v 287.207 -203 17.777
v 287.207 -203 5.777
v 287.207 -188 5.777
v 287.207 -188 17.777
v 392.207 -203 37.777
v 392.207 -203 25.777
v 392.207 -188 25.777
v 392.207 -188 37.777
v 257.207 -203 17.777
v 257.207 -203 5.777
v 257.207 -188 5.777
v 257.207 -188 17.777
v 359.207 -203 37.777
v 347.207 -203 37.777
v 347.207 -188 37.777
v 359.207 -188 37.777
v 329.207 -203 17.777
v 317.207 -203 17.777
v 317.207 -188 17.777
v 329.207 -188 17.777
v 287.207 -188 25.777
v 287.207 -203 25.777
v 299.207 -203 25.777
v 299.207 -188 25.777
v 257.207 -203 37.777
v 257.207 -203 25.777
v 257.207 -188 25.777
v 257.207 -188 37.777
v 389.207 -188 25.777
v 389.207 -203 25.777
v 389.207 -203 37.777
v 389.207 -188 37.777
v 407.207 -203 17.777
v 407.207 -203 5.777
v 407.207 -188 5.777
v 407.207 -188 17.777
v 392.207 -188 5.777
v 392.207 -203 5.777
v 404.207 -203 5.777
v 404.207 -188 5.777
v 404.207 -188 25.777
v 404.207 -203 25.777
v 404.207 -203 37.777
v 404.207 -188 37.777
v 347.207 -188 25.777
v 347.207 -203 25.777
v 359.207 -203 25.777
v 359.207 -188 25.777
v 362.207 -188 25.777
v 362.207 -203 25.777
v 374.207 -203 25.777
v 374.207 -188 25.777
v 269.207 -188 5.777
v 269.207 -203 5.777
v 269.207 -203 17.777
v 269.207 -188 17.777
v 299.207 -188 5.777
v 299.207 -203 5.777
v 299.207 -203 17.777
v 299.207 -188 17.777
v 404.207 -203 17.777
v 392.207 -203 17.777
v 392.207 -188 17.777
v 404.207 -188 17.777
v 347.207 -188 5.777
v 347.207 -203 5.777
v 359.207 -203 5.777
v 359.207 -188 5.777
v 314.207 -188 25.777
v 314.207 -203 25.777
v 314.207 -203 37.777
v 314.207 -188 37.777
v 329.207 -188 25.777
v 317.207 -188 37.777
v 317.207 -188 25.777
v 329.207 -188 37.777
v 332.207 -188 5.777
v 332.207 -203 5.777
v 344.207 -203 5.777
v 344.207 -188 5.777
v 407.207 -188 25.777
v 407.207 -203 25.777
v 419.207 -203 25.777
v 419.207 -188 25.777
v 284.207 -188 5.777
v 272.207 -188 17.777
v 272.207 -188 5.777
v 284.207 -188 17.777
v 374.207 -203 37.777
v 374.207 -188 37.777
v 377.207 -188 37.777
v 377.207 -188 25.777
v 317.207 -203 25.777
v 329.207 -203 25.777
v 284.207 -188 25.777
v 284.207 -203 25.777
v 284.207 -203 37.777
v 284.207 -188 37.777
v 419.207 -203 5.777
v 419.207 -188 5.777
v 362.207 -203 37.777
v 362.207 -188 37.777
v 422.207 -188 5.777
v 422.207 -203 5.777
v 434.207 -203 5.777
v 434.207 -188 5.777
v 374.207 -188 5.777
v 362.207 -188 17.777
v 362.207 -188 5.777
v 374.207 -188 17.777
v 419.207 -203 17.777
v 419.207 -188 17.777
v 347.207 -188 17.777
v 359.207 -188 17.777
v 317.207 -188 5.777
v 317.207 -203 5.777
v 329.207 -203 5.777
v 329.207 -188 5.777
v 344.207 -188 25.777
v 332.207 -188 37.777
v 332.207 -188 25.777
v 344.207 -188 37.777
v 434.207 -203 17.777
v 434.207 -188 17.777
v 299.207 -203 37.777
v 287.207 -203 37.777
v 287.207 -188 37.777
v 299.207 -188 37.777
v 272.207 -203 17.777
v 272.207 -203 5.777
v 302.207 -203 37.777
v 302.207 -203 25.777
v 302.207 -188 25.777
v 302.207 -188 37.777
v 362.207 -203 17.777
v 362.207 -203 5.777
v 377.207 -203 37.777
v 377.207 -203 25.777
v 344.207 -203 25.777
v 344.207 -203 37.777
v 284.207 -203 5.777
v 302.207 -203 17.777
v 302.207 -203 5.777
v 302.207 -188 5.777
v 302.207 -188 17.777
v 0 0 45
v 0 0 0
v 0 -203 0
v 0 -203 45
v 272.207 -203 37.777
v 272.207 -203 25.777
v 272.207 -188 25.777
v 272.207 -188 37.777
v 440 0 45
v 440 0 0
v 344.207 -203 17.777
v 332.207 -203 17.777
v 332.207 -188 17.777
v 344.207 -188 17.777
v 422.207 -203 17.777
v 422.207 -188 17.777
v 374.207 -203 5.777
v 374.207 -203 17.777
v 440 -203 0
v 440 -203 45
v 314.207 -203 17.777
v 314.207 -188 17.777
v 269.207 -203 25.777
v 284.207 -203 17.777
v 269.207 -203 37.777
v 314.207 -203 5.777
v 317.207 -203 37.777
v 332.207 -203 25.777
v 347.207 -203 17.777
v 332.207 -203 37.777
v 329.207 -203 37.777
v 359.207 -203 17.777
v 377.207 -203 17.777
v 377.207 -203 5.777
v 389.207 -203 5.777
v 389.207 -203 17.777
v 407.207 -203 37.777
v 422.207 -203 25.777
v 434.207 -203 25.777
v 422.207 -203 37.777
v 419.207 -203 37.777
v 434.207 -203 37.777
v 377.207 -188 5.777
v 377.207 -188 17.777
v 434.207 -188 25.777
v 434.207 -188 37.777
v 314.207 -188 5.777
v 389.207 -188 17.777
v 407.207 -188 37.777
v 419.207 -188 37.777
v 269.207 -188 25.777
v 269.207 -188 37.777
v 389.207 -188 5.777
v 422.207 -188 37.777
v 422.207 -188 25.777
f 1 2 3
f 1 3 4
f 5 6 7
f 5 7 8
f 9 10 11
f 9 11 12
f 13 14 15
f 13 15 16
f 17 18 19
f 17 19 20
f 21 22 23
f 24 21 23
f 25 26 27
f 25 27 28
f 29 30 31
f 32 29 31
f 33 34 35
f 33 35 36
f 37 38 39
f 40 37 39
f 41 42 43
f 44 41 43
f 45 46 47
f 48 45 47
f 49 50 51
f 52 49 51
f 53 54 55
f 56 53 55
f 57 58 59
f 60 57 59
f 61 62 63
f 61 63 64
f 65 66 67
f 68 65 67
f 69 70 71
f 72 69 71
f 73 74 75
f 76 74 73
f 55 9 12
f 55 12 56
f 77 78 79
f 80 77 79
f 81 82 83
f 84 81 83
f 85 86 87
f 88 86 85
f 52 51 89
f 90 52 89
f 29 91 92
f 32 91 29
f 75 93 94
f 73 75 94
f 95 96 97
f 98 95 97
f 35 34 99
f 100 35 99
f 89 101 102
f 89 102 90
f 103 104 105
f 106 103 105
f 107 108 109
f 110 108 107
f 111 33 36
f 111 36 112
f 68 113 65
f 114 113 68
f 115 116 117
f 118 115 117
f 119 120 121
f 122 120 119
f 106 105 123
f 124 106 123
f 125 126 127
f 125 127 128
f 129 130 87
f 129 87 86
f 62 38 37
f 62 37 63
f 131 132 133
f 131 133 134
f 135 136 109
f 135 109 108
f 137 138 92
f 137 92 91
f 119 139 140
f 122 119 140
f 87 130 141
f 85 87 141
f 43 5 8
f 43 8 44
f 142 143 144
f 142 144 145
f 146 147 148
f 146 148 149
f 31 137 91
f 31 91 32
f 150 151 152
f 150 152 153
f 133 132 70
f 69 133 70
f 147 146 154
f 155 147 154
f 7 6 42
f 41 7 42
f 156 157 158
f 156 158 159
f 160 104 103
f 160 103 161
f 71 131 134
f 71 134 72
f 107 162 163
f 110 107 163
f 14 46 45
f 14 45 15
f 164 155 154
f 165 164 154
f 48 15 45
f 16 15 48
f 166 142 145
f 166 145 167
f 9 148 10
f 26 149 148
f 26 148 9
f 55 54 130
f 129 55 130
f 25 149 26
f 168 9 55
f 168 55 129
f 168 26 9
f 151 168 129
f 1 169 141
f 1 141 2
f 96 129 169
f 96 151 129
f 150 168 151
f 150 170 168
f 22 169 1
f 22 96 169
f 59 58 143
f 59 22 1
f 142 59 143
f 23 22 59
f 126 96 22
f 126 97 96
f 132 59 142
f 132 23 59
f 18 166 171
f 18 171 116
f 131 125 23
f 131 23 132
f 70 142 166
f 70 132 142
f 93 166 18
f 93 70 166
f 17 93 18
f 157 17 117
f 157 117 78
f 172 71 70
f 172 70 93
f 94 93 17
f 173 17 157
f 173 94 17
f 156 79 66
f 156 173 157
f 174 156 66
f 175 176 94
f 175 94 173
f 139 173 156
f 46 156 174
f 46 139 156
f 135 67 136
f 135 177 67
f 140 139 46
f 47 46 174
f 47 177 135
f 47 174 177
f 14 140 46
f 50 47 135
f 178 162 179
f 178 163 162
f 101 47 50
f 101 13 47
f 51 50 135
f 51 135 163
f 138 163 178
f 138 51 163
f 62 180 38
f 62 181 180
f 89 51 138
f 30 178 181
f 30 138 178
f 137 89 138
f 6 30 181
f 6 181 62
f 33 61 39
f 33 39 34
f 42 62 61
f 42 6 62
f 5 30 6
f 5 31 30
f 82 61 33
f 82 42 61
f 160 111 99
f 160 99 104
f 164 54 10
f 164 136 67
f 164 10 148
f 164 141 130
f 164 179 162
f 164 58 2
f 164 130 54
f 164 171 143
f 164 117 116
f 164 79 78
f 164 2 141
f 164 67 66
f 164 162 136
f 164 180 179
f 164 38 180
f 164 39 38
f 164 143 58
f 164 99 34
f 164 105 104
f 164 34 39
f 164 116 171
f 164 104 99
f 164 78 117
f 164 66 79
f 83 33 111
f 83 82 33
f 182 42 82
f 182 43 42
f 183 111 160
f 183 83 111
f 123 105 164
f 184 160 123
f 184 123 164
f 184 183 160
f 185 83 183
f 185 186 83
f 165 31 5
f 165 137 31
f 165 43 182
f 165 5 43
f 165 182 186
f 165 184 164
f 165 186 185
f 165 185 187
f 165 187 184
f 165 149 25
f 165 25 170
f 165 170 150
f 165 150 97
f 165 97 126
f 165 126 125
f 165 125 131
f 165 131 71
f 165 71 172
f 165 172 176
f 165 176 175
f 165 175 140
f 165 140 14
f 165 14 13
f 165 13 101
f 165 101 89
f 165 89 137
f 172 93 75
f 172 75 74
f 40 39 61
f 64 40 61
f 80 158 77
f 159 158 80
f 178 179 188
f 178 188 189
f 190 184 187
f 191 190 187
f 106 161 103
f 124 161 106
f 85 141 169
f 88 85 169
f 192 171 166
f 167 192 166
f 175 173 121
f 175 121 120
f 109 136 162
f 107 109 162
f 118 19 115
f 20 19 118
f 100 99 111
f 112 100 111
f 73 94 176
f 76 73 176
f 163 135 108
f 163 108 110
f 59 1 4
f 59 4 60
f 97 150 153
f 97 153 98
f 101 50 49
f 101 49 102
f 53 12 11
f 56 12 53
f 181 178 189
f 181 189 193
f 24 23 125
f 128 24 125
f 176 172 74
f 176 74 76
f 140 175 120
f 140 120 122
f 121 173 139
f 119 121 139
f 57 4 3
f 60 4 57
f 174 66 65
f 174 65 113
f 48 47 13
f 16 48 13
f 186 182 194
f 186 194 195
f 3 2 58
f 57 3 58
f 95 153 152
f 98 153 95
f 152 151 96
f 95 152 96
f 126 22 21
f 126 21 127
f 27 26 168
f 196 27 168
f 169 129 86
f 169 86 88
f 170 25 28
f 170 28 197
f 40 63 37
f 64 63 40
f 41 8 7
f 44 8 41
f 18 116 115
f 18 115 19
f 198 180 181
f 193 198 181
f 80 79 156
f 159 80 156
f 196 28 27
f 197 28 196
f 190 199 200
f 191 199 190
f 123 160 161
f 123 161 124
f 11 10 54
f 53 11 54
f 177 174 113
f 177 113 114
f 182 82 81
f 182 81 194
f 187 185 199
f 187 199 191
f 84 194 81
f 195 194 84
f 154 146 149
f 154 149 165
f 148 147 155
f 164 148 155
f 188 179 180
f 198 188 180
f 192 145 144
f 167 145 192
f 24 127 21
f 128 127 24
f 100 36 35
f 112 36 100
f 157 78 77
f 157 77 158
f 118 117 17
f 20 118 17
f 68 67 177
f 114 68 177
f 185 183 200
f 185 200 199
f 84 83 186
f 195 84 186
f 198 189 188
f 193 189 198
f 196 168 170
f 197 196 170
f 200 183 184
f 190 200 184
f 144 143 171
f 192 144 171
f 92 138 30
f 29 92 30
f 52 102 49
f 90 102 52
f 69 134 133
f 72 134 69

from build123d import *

# Parameters (mm, degrees)
F0_W     = 440
F0_H     = 45
F1_DEPTH = 203
F2_W     = 12
F2_H     = 12
F3_DEPTH = 15


with BuildPart() as f1:
    # F0 (on Front) → F1 (new body)
    with BuildSketch(Plane.XZ):
        with Locations((220, 22.5)):
            Rectangle(F0_W, F0_H)
    extrude(amount=F1_DEPTH)

    # F2 (on face) → F3 (cut)
    with BuildSketch(Plane.XZ.offset(203)):
        with Locations((428.20741, 31.776955)):
            Rectangle(F2_W, F2_H)
        with Locations((413.20741, 31.776955)):
            Rectangle(F2_W, F2_H)
        with Locations((383.20741, 31.776955)):
            Rectangle(F2_W, F2_H)
        with Locations((398.20741, 31.776955)):
            Rectangle(F2_W, F2_H)
        with Locations((368.20741, 31.776955)):
            Rectangle(F2_W, F2_H)
        with Locations((353.20741, 31.776955)):
            Rectangle(F2_W, F2_H)
        with Locations((338.20741, 31.776955)):
            Rectangle(F2_W, F2_H)
        with Locations((323.20741, 31.776955)):
            Rectangle(F2_W, F2_H)
        with Locations((308.20741, 31.776955)):
            Rectangle(F2_W, F2_H)
        with Locations((293.20741, 31.776955)):
            Rectangle(F2_W, F2_H)
        with Locations((278.20741, 31.776955)):
            Rectangle(F2_W, F2_H)
        with Locations((263.20741, 31.776955)):
            Rectangle(F2_W, F2_H)
        with Locations((428.20741, 11.776955)):
            Rectangle(F2_W, F2_H)
        with Locations((413.20741, 11.776955)):
            Rectangle(F2_W, F2_H)
        with Locations((263.20741, 11.776955)):
            Rectangle(F2_W, F2_H)
        with Locations((278.20741, 11.776955)):
            Rectangle(F2_W, F2_H)
        with Locations((293.20741, 11.776955)):
            Rectangle(F2_W, F2_H)
        with Locations((308.20741, 11.776955)):
            Rectangle(F2_W, F2_H)
        with Locations((323.20741, 11.776955)):
            Rectangle(F2_W, F2_H)
        with Locations((338.20741, 11.776955)):
            Rectangle(F2_W, F2_H)
        with Locations((353.20741, 11.776955)):
            Rectangle(F2_W, F2_H)
        with Locations((368.20741, 11.776955)):
            Rectangle(F2_W, F2_H)
        with Locations((383.20741, 11.776955)):
            Rectangle(F2_W, F2_H)
        with Locations((398.20741, 11.776955)):
            Rectangle(F2_W, F2_H)
    extrude(amount=-F3_DEPTH, mode=Mode.SUBTRACT)


solid = f1.part
